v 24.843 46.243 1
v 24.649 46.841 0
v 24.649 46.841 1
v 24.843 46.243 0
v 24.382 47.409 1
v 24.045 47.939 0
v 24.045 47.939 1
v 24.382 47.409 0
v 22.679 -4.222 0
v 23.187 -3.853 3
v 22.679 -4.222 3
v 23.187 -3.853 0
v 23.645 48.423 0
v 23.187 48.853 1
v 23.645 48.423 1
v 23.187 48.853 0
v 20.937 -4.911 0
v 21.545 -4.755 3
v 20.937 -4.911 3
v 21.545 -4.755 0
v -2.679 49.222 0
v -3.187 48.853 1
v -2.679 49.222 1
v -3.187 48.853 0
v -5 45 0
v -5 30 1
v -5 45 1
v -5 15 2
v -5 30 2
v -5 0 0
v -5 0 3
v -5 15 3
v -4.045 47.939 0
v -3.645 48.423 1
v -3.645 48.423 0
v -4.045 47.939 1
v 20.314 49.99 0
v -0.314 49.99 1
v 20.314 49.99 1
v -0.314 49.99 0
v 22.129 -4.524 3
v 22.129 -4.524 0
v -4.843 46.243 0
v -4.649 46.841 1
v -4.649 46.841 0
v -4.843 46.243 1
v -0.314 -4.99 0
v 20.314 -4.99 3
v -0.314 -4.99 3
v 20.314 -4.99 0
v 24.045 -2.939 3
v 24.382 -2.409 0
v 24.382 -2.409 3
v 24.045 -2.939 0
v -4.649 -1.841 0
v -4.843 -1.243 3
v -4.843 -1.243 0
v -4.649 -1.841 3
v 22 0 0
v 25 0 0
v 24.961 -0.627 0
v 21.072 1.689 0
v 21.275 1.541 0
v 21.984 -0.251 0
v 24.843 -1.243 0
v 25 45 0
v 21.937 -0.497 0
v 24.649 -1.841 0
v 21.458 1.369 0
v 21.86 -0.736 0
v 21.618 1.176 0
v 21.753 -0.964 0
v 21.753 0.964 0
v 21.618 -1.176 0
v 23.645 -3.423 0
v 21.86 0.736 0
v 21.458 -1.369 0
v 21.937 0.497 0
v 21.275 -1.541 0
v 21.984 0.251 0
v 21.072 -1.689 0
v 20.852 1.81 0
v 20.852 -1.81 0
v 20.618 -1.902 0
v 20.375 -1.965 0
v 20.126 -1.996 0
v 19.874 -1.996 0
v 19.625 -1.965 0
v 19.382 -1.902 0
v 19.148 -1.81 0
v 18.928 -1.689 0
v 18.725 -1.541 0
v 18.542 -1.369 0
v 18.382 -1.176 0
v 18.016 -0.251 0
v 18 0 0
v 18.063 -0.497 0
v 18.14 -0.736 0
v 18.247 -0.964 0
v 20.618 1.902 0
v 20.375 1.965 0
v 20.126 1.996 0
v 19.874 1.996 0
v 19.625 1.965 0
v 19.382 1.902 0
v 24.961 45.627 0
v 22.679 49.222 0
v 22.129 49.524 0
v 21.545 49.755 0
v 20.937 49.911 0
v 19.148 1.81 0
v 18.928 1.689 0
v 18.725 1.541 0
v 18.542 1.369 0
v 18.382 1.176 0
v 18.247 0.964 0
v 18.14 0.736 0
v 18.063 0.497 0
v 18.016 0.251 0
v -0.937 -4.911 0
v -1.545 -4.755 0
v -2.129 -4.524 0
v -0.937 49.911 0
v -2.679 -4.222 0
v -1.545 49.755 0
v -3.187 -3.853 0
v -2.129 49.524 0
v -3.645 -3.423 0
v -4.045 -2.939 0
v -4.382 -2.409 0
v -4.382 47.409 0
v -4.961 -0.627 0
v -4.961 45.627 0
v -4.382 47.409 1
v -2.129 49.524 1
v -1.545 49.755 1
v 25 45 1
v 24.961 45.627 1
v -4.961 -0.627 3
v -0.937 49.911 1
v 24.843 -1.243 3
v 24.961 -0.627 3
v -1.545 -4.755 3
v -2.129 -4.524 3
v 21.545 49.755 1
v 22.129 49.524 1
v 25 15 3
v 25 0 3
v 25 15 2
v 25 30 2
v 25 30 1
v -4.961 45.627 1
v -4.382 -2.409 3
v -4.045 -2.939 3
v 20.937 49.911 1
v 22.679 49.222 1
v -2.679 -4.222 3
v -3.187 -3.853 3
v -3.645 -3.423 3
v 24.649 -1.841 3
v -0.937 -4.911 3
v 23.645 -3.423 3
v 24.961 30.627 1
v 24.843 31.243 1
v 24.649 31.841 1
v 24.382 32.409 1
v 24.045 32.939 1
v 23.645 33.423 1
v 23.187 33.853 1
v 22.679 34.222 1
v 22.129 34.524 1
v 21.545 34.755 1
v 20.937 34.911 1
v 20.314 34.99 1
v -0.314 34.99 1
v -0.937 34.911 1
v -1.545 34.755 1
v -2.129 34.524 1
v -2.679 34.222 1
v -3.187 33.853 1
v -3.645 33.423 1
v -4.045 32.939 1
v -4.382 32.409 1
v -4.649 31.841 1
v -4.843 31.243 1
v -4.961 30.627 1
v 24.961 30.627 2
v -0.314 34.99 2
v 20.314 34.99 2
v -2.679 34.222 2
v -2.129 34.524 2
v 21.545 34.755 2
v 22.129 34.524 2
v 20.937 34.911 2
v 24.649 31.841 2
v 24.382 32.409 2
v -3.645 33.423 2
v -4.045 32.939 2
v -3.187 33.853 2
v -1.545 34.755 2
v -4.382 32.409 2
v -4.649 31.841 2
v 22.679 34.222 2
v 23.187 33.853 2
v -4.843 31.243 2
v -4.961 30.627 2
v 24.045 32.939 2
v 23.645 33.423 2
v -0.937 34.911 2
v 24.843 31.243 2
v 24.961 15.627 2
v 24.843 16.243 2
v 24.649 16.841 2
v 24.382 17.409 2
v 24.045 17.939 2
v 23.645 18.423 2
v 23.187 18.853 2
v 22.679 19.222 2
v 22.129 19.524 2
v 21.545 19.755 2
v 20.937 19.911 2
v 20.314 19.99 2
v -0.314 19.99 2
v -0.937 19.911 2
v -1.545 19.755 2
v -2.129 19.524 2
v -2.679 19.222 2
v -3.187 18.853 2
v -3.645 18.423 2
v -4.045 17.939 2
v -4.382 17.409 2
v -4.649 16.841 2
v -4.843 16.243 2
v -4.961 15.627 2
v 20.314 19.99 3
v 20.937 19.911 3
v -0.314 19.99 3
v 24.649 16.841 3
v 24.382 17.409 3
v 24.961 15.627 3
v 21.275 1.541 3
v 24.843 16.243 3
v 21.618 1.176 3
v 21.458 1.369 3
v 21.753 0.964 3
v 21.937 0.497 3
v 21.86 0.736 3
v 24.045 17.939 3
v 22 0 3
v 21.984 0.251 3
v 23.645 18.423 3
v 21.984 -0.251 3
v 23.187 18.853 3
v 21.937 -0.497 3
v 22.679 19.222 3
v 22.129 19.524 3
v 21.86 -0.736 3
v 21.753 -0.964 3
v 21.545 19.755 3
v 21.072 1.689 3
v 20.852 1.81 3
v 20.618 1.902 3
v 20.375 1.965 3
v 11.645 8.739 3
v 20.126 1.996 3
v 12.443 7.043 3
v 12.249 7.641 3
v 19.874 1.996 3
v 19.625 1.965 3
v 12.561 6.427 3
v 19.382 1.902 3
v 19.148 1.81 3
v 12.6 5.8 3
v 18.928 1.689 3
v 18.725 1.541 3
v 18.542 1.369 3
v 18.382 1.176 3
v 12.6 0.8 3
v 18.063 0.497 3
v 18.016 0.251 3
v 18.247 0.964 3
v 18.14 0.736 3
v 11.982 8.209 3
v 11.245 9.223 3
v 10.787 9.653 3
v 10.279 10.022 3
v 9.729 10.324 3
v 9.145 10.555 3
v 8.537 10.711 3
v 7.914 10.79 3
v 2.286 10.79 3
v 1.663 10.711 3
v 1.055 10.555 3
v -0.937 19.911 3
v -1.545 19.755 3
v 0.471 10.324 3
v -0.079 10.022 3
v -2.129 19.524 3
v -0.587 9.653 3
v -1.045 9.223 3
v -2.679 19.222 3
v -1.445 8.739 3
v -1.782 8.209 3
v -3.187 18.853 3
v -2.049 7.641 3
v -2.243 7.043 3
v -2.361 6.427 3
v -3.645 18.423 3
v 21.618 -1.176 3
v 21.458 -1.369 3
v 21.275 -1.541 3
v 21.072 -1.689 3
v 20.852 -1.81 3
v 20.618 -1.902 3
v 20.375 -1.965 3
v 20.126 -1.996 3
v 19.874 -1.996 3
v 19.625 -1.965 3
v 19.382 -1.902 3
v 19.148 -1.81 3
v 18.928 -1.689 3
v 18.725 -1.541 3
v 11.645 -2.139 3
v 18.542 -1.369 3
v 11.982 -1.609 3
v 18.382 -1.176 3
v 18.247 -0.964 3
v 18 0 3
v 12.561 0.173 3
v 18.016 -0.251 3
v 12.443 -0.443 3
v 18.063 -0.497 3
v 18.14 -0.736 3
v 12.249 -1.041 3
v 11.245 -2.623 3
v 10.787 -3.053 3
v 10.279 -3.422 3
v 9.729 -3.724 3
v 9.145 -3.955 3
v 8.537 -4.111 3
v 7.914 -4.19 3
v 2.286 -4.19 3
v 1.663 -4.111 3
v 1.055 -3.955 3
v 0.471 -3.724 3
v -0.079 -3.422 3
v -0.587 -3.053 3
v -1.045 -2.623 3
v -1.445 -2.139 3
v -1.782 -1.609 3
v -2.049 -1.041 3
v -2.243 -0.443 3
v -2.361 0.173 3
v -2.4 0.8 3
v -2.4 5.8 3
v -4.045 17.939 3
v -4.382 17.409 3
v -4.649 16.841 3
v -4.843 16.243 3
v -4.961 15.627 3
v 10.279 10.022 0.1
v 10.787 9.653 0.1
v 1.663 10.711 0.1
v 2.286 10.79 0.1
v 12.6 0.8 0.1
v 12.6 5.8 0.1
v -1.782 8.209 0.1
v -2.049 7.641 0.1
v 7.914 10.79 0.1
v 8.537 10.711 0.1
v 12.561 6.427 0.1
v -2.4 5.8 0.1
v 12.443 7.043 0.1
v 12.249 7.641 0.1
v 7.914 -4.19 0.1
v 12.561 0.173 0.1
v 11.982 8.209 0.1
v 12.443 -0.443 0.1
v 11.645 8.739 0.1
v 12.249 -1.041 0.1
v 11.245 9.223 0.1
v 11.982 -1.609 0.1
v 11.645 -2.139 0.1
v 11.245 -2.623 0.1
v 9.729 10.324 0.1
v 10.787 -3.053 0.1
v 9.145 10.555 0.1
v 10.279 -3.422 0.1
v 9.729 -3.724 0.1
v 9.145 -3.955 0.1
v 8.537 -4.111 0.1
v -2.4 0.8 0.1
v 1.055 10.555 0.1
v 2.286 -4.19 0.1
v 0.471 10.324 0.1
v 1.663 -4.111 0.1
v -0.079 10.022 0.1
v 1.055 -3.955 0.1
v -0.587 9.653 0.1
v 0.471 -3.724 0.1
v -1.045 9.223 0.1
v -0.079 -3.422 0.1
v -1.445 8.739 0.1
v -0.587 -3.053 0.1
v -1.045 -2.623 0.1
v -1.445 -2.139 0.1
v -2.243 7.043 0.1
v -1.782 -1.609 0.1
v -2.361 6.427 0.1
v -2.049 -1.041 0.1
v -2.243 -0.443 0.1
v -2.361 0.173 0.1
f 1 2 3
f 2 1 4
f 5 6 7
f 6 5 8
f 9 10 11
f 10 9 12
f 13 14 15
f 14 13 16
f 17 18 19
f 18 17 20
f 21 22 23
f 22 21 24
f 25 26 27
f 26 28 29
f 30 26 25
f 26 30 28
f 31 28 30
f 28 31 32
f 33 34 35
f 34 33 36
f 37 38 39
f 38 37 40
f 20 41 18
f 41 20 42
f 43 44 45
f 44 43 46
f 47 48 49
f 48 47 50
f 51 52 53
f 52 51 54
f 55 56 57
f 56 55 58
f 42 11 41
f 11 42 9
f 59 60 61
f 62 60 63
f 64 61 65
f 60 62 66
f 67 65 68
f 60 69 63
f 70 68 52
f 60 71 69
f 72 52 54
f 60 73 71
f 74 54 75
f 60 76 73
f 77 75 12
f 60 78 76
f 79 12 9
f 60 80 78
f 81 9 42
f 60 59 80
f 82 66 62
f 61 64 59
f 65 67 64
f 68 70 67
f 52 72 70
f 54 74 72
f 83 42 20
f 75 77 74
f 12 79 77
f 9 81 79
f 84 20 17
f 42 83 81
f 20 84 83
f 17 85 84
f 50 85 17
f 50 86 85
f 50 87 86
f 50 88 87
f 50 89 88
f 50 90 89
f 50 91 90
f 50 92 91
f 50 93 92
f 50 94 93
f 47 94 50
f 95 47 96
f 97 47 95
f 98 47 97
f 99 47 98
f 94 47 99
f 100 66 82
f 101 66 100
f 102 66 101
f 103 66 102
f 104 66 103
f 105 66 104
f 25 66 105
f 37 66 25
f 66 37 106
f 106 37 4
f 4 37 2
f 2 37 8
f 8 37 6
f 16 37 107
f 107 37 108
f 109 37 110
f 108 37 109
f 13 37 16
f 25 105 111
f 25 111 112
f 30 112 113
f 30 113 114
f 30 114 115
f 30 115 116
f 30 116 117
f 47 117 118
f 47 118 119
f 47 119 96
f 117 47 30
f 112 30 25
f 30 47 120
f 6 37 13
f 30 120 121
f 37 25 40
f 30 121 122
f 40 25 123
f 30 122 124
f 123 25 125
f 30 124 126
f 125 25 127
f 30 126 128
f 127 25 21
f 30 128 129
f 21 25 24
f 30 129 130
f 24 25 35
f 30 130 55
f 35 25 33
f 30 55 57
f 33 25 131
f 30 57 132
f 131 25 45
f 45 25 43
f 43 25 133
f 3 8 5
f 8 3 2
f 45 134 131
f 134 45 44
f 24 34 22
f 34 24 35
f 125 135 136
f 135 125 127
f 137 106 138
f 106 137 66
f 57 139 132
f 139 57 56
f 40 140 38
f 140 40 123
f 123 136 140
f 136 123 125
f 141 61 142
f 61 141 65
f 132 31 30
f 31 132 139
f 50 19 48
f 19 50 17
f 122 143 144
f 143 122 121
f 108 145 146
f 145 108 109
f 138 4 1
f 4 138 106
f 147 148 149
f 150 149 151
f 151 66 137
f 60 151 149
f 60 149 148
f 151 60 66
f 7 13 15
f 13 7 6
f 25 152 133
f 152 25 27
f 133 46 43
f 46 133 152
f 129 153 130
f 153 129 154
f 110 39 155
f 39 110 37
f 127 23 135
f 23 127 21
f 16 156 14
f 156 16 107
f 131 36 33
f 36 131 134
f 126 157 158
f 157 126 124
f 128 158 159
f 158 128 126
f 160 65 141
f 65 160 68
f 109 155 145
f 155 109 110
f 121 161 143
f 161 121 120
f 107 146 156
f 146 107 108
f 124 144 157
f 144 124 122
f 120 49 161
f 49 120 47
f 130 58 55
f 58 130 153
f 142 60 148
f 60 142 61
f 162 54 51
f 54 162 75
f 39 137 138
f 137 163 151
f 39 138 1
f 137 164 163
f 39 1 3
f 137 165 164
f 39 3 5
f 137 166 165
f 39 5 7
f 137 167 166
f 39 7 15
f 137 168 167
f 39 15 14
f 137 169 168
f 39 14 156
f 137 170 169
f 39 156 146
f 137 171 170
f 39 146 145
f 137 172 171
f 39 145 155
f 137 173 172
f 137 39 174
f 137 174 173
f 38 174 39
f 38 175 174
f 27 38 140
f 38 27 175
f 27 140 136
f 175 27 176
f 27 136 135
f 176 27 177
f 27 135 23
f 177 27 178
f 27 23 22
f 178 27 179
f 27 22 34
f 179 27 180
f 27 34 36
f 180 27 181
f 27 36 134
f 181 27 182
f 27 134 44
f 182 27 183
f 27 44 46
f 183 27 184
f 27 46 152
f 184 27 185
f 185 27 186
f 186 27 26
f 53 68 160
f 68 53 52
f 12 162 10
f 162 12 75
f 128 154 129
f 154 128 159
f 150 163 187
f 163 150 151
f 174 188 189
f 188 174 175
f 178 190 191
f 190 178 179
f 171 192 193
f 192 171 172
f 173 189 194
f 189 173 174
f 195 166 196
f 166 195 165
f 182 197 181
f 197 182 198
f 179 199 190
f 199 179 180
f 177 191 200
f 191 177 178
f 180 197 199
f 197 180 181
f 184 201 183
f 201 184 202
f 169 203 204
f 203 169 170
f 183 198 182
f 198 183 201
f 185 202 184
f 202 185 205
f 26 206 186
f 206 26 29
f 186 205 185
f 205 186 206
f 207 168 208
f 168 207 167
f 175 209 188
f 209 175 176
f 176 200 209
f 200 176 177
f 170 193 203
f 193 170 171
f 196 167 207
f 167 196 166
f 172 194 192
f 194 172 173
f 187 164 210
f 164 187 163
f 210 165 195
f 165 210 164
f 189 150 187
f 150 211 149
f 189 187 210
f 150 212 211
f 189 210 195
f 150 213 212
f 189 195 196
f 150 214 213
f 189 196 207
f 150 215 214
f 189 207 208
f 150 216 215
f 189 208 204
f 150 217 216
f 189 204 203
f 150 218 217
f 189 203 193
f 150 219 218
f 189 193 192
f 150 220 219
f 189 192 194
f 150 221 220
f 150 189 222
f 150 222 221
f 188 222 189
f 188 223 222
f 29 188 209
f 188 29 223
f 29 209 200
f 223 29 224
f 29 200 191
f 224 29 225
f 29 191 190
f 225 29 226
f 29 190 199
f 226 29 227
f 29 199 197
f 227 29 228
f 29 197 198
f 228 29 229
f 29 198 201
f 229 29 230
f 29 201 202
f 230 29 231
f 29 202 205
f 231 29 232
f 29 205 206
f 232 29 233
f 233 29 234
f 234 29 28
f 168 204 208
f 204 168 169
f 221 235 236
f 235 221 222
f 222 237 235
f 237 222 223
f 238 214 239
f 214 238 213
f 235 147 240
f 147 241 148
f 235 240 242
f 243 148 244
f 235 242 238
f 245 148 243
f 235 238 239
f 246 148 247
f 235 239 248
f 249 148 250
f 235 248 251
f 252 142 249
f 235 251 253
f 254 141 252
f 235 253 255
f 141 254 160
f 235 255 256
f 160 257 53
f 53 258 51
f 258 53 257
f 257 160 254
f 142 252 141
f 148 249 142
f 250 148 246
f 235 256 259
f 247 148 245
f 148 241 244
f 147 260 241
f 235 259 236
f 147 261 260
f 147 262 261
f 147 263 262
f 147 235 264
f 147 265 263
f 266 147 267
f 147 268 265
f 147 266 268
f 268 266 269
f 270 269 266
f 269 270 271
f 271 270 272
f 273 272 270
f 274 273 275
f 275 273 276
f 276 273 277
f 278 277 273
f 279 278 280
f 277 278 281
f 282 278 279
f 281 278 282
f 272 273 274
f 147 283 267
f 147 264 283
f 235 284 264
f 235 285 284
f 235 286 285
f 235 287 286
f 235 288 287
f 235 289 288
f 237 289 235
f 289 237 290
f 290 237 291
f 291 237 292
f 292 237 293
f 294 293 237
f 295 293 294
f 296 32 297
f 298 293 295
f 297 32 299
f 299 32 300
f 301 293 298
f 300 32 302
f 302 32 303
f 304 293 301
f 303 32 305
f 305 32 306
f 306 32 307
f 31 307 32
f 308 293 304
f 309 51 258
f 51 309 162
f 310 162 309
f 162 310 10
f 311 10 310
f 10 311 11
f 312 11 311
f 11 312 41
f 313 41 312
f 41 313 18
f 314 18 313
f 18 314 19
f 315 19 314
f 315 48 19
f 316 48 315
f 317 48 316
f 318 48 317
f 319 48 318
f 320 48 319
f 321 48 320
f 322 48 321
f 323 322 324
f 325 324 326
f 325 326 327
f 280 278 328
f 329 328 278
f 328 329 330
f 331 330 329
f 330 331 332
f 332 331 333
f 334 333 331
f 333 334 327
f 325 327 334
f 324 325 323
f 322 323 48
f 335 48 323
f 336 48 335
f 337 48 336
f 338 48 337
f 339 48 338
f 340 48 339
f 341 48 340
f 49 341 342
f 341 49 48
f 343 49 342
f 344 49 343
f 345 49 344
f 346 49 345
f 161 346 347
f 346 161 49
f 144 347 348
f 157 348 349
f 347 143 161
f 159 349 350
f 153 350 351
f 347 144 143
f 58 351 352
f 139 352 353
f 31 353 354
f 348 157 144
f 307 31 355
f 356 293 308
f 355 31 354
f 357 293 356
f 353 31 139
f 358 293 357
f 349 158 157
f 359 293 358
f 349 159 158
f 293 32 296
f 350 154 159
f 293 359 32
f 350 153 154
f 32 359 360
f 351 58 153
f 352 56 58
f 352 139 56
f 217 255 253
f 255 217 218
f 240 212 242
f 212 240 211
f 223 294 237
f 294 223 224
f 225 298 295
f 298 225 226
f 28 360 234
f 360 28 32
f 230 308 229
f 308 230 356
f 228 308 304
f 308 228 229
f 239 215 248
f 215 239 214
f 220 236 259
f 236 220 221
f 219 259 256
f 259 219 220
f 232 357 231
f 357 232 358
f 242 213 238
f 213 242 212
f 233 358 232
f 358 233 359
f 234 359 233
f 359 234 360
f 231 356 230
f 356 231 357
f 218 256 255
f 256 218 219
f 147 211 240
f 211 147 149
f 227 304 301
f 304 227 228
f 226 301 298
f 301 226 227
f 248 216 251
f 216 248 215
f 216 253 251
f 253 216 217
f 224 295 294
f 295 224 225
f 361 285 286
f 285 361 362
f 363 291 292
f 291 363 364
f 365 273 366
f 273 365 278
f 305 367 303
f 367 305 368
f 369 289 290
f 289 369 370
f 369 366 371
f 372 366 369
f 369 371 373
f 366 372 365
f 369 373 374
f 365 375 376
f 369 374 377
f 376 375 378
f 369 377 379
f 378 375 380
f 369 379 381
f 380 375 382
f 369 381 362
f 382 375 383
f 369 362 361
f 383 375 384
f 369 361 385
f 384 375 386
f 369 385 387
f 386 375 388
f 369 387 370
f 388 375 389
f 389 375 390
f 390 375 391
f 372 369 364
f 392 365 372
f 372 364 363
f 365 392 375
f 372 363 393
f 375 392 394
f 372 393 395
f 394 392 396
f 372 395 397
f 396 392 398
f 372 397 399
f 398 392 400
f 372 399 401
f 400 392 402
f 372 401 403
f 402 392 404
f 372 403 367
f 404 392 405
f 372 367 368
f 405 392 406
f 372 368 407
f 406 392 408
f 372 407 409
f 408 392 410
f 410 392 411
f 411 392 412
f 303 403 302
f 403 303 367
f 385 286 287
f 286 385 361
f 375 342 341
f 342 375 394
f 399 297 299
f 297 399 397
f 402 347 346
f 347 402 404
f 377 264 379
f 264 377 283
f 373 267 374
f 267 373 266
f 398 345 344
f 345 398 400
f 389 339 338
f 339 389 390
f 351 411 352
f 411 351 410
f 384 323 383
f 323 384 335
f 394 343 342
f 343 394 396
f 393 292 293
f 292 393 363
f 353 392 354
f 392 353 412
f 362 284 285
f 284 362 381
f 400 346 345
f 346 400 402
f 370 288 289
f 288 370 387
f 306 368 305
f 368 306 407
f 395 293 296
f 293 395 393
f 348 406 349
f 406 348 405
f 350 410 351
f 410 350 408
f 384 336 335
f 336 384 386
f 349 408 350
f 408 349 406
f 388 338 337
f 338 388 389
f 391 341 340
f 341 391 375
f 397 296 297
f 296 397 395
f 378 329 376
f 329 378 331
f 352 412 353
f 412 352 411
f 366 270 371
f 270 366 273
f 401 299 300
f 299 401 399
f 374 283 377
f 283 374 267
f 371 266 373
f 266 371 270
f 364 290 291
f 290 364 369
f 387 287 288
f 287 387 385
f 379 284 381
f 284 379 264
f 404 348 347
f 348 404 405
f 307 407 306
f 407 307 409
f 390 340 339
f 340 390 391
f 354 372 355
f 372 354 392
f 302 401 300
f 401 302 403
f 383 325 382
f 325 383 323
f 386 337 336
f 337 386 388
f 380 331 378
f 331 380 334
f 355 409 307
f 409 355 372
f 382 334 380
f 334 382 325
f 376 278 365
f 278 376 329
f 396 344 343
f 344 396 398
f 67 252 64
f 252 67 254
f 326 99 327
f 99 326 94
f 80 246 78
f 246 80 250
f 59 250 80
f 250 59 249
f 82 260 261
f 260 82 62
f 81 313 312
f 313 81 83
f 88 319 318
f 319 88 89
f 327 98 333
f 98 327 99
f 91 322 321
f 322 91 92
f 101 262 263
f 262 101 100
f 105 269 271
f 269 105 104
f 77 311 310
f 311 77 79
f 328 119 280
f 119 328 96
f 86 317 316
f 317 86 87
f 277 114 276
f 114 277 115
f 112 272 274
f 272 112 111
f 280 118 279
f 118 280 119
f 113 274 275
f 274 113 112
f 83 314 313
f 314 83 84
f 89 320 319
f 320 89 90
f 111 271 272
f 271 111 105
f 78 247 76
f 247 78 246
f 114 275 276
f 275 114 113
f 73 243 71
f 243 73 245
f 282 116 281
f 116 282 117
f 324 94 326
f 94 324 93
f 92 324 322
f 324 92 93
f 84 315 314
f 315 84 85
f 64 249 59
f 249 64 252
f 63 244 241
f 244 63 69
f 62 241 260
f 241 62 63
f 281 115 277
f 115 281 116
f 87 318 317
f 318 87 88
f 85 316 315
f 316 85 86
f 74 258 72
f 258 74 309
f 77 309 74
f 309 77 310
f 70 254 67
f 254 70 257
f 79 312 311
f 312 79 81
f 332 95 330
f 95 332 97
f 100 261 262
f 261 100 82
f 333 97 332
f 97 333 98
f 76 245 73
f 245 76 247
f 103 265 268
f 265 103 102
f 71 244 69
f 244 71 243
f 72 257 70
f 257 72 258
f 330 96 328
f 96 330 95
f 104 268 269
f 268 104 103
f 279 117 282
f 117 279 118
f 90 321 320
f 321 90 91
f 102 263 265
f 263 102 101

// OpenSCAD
lowheight=1;
midheight=2;
highheight=3;
windowheight=.1;
narrowwall=.8;
thickwall=2.6;



$fn=50;
difference(){
    union(){

        minkowski(){
            cube([20,45,lowheight-.5]);
            cylinder(r=5,h=.5);
        }
        minkowski(){
            cube([20,30,midheight-.5]);
            cylinder(r=5,h=.5);
        }
        minkowski(){
            cube([20,15,highheight-.5]);
            cylinder(r=5,h=.5);
        }
    }
    union(){
        minkowski(){
            translate([thickwall,narrowwall,windowheight])cube([5,5,highheight+1]);
            cylinder(r=5,h=.5);
        }
        translate([20,0,0])cylinder(d=4,h=10,center=true);
    }
}
